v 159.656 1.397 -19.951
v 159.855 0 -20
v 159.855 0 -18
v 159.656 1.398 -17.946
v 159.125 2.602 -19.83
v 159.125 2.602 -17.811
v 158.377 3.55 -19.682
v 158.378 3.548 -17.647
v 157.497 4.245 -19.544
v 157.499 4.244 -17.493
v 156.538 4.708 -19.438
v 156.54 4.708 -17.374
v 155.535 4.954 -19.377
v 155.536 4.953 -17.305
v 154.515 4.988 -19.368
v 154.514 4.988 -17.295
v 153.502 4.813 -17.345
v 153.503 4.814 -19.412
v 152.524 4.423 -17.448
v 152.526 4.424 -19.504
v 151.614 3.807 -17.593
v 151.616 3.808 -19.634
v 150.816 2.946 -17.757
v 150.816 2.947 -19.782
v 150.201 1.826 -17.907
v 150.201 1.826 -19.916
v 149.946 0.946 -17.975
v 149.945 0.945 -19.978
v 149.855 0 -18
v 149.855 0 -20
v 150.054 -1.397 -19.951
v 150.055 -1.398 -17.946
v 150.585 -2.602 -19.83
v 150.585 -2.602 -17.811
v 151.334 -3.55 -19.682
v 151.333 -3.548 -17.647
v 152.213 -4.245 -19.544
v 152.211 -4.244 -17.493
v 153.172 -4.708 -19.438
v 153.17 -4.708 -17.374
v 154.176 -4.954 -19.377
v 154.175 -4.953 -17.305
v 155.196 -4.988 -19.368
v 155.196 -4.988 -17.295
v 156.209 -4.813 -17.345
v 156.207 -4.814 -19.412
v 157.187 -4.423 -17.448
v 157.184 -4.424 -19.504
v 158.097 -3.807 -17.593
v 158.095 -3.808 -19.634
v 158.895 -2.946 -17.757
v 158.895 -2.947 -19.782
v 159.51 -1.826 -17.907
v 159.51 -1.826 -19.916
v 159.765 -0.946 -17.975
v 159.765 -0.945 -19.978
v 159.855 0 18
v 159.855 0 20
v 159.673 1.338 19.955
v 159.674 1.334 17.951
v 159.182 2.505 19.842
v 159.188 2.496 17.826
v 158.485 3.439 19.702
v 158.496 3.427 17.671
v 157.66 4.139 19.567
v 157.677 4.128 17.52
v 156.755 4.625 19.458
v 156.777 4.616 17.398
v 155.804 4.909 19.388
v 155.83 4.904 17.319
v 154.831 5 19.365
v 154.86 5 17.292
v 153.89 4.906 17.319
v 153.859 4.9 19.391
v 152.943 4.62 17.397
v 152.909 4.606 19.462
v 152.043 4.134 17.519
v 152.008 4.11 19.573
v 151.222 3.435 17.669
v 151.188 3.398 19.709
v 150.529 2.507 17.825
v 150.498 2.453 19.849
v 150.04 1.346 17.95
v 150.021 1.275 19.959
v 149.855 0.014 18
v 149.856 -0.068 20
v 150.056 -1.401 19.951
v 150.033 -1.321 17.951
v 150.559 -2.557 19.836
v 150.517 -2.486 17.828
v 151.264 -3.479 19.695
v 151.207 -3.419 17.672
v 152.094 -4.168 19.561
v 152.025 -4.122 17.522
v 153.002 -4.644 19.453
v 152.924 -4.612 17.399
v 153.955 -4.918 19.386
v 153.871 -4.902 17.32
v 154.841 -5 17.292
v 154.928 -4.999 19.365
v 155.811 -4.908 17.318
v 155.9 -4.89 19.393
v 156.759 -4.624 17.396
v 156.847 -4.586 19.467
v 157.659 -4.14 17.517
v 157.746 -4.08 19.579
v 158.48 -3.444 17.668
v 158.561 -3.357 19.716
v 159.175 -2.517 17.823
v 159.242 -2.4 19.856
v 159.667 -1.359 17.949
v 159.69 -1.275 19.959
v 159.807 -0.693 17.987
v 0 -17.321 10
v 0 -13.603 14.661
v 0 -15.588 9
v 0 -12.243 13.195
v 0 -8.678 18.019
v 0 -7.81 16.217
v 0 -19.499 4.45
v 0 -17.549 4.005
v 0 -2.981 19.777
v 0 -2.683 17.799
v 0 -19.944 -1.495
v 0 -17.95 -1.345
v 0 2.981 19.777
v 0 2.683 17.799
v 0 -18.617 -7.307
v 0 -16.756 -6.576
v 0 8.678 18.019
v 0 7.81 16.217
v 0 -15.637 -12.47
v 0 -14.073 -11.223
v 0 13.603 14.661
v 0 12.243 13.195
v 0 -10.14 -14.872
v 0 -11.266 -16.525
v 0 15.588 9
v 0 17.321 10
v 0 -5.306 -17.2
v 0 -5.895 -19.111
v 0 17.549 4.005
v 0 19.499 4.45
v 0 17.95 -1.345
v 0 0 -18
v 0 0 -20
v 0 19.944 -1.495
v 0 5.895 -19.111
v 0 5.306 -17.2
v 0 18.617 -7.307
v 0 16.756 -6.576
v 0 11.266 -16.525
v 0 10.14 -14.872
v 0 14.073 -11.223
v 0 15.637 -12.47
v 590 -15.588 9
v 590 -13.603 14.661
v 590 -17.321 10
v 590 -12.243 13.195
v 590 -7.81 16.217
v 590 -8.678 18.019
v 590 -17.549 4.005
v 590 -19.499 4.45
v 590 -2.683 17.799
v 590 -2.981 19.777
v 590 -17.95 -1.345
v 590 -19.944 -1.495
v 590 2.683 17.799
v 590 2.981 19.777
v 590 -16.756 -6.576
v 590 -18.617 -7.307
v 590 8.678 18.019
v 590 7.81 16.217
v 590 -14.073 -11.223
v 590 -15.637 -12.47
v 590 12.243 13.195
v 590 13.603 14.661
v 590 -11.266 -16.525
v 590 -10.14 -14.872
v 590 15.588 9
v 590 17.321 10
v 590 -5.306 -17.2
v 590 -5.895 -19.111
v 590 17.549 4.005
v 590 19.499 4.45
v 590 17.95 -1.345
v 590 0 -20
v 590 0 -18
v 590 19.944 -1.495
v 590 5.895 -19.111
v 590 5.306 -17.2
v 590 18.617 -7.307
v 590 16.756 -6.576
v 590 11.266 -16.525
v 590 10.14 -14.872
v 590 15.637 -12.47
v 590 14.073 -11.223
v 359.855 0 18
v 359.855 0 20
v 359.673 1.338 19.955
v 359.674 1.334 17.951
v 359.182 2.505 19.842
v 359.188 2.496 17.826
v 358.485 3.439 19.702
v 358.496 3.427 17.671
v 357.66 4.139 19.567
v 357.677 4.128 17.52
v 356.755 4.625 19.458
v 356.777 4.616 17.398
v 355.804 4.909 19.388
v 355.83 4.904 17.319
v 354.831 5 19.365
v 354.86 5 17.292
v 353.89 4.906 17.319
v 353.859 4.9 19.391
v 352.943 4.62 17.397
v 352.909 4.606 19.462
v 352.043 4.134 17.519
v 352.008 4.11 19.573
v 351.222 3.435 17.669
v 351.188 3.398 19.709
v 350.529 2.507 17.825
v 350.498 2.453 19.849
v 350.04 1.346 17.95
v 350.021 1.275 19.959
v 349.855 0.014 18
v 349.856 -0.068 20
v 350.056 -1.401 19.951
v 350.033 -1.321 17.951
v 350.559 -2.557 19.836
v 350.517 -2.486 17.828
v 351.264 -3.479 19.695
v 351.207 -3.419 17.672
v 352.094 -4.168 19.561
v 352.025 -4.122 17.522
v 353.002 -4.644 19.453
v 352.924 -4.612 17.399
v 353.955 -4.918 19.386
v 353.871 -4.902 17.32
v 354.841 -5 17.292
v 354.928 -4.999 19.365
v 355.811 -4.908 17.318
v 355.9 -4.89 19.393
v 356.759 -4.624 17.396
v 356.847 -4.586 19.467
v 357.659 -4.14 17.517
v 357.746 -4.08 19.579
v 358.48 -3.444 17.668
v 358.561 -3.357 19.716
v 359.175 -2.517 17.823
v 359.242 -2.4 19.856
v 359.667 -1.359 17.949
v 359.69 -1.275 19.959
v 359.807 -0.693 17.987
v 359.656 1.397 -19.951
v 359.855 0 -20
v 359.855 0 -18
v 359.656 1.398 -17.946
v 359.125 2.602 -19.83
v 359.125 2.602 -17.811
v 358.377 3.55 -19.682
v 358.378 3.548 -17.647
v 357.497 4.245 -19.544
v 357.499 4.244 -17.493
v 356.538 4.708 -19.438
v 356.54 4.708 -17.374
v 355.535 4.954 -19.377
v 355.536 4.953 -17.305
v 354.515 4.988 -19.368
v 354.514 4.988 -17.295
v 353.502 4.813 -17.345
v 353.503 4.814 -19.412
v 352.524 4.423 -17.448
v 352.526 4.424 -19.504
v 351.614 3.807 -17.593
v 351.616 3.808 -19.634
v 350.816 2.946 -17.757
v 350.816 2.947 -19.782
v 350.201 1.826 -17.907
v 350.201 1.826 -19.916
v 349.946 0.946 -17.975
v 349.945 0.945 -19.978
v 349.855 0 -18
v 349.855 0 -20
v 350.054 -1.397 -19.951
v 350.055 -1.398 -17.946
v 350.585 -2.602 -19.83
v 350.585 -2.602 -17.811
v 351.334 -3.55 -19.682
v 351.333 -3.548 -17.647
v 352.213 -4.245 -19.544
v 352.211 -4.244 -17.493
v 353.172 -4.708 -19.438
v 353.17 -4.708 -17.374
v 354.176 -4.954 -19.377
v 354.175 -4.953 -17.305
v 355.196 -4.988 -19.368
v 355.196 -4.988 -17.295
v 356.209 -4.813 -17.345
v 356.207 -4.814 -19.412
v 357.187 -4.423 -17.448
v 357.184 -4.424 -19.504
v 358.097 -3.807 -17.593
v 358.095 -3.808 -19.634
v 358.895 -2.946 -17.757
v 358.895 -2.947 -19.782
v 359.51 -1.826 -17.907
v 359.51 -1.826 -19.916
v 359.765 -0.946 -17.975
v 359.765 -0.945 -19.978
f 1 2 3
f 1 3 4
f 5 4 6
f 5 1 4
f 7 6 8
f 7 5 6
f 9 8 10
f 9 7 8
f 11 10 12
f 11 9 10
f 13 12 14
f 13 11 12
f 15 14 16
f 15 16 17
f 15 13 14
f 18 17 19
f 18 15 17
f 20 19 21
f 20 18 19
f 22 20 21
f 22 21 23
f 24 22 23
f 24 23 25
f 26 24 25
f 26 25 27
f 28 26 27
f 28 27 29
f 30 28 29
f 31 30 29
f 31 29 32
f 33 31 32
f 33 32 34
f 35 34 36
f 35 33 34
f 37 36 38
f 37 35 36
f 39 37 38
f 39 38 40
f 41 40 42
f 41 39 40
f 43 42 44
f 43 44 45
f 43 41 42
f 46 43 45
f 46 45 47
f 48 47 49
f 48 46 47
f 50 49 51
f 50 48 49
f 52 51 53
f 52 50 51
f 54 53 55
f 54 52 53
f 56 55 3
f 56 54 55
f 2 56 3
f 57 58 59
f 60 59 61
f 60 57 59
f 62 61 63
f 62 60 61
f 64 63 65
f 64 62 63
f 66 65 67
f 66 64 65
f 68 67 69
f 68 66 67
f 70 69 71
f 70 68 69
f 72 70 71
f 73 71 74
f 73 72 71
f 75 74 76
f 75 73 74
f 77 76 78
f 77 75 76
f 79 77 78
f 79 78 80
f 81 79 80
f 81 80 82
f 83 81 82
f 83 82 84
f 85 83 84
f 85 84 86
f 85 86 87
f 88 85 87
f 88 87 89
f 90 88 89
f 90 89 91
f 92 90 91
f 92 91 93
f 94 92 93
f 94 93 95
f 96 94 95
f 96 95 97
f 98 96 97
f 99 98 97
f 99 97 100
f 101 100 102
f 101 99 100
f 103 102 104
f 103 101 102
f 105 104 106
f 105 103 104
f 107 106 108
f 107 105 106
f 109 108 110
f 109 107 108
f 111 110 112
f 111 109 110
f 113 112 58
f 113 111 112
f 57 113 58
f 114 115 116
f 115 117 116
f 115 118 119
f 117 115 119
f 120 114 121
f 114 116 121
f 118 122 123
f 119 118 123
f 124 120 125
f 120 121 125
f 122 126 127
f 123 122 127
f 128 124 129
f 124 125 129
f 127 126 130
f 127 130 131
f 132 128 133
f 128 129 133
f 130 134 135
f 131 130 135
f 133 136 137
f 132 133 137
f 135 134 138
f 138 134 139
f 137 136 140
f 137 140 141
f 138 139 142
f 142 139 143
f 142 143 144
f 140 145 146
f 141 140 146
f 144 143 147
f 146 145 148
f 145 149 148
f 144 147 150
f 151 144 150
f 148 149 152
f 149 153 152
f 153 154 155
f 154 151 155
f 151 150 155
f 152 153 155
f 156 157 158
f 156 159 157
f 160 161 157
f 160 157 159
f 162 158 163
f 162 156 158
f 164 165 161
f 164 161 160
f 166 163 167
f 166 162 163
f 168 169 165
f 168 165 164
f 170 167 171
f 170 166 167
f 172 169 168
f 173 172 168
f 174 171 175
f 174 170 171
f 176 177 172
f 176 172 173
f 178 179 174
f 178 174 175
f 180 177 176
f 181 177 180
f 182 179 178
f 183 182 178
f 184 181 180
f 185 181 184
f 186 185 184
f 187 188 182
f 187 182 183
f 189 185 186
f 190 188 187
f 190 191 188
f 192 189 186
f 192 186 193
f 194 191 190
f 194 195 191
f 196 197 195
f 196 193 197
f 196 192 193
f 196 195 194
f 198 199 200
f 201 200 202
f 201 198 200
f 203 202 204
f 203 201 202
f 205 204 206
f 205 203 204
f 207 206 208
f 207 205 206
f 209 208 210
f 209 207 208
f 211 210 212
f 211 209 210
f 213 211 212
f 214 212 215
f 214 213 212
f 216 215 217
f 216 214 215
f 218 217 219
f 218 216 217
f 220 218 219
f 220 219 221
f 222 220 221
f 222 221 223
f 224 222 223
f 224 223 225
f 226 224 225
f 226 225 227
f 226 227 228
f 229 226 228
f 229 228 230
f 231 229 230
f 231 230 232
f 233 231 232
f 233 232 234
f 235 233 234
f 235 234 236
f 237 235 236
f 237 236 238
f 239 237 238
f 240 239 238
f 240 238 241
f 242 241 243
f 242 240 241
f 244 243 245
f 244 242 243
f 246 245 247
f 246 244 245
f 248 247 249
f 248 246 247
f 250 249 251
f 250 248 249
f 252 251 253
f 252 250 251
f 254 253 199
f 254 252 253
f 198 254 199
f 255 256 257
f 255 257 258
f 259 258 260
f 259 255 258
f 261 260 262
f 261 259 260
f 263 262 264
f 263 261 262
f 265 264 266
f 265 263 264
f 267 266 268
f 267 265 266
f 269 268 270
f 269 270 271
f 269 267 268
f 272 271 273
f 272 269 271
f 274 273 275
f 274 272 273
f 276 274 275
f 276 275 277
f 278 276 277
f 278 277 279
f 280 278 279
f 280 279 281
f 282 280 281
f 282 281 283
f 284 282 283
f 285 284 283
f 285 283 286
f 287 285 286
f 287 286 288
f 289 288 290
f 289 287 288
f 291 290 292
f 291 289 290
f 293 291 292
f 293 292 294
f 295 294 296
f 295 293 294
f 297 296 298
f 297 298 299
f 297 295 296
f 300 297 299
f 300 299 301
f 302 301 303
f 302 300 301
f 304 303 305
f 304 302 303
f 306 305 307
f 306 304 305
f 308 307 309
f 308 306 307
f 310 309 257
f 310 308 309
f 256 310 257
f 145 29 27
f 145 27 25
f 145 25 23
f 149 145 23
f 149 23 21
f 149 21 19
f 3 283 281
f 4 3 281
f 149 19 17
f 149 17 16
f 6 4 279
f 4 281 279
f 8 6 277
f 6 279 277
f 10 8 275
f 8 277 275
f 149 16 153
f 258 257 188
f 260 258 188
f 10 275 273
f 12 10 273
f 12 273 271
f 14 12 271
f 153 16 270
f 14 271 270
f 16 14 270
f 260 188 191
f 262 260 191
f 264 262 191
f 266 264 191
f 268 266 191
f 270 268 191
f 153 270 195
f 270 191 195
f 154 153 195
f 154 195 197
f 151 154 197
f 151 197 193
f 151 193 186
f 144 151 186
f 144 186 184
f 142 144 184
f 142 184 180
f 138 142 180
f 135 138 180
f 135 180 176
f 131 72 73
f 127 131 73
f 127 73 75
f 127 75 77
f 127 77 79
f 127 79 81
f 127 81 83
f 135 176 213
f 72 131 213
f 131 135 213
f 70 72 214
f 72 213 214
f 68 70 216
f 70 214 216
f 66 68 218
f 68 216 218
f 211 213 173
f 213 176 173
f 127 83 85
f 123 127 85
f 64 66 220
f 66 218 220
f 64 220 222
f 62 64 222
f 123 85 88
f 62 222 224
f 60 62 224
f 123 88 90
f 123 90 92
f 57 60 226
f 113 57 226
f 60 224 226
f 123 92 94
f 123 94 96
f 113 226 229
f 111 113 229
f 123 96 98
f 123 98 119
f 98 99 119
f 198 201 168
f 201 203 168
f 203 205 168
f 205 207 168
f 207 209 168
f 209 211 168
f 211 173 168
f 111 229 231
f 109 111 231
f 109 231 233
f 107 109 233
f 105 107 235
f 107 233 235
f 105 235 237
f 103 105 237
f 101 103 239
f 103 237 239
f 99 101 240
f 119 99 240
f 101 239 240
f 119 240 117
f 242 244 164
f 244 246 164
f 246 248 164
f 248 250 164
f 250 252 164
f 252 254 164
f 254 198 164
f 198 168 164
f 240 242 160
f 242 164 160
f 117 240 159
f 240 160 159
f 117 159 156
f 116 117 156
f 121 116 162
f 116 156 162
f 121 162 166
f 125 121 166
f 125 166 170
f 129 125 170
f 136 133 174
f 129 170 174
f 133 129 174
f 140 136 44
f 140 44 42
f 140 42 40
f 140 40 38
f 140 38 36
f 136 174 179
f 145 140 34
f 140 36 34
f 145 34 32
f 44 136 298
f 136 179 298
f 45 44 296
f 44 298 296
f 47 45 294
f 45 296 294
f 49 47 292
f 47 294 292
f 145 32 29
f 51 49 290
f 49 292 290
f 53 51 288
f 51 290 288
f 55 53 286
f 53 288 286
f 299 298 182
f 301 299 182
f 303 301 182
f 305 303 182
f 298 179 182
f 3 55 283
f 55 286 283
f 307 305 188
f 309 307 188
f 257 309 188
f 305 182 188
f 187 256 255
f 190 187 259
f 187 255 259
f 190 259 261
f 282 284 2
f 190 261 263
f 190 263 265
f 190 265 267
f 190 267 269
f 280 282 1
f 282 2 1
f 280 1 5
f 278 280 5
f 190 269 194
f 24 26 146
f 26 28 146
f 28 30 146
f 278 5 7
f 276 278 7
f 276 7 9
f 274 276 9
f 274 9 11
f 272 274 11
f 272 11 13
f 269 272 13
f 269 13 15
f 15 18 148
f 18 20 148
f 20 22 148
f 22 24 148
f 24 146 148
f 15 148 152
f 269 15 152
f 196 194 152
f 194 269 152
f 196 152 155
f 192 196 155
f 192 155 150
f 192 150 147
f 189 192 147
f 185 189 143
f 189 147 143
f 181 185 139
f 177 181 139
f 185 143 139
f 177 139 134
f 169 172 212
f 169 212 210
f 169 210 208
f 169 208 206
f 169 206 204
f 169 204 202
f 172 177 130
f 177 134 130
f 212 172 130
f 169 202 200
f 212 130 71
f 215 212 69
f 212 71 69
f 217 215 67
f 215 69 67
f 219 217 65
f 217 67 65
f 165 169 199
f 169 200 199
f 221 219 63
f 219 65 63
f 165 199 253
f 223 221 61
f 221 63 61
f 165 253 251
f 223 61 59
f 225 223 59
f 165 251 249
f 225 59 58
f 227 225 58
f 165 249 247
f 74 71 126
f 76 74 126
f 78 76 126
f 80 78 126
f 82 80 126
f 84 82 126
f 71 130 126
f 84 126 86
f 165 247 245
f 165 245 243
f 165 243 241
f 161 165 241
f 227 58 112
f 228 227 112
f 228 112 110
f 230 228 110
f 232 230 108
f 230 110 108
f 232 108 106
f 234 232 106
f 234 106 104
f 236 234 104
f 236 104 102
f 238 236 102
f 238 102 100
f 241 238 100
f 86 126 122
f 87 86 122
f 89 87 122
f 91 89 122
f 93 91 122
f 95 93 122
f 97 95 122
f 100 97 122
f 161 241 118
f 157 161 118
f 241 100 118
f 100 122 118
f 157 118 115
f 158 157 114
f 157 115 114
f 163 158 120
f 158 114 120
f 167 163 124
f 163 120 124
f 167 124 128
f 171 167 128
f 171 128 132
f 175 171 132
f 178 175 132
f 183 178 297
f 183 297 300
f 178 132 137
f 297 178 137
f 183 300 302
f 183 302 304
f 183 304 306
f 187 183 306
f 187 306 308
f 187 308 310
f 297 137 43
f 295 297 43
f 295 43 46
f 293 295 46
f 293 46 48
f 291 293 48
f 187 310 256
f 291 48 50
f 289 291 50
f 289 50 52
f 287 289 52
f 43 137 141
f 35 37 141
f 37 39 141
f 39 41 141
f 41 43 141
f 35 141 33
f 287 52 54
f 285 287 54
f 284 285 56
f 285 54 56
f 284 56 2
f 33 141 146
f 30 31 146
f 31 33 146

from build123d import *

# Parameters (mm, degrees)
SKETCH1_R               = 20
BOSS_EXTRUDE1_DEPTH     = 590
SKETCH2_R               = 18
CUT_EXTRUDE1_DEPTH      = 602
CUT_EXTRUDE2_DEPTH      = 591.677577025
CUT_EXTRUDE2_DEPTH_BACK = 591.677577025
SKETCH3_R               = 5


with BuildPart() as part:
    # Sketch1 → Boss-Extrude1 (new body)
    with BuildSketch(Plane(origin=(0, 0, 0), x_dir=(0, 0, -1), z_dir=(1, 0, 0))):
        Circle(SKETCH1_R)
    extrude(amount=BOSS_EXTRUDE1_DEPTH)

    # Sketch2 → Cut-Extrude1 (cut)
    with BuildSketch(Plane(origin=(590, 0, 0), x_dir=(0, 0, -1), z_dir=(1, 0, 0))):
        Circle(SKETCH2_R)
    extrude(amount=-CUT_EXTRUDE1_DEPTH, mode=Mode.SUBTRACT)

    # Sketch3 → Cut-Extrude2 (cut, two sides: drawn at the far end of the back side and taken through both)
    with BuildSketch(Plane.XY.offset(-CUT_EXTRUDE2_DEPTH_BACK)):
        with Locations((154.855292025, 0)):
            Circle(SKETCH3_R)
        with Locations((354.855292025, 0)):
            Circle(SKETCH3_R)
    extrude(amount=CUT_EXTRUDE2_DEPTH + CUT_EXTRUDE2_DEPTH_BACK, mode=Mode.SUBTRACT)


solid = part.part
